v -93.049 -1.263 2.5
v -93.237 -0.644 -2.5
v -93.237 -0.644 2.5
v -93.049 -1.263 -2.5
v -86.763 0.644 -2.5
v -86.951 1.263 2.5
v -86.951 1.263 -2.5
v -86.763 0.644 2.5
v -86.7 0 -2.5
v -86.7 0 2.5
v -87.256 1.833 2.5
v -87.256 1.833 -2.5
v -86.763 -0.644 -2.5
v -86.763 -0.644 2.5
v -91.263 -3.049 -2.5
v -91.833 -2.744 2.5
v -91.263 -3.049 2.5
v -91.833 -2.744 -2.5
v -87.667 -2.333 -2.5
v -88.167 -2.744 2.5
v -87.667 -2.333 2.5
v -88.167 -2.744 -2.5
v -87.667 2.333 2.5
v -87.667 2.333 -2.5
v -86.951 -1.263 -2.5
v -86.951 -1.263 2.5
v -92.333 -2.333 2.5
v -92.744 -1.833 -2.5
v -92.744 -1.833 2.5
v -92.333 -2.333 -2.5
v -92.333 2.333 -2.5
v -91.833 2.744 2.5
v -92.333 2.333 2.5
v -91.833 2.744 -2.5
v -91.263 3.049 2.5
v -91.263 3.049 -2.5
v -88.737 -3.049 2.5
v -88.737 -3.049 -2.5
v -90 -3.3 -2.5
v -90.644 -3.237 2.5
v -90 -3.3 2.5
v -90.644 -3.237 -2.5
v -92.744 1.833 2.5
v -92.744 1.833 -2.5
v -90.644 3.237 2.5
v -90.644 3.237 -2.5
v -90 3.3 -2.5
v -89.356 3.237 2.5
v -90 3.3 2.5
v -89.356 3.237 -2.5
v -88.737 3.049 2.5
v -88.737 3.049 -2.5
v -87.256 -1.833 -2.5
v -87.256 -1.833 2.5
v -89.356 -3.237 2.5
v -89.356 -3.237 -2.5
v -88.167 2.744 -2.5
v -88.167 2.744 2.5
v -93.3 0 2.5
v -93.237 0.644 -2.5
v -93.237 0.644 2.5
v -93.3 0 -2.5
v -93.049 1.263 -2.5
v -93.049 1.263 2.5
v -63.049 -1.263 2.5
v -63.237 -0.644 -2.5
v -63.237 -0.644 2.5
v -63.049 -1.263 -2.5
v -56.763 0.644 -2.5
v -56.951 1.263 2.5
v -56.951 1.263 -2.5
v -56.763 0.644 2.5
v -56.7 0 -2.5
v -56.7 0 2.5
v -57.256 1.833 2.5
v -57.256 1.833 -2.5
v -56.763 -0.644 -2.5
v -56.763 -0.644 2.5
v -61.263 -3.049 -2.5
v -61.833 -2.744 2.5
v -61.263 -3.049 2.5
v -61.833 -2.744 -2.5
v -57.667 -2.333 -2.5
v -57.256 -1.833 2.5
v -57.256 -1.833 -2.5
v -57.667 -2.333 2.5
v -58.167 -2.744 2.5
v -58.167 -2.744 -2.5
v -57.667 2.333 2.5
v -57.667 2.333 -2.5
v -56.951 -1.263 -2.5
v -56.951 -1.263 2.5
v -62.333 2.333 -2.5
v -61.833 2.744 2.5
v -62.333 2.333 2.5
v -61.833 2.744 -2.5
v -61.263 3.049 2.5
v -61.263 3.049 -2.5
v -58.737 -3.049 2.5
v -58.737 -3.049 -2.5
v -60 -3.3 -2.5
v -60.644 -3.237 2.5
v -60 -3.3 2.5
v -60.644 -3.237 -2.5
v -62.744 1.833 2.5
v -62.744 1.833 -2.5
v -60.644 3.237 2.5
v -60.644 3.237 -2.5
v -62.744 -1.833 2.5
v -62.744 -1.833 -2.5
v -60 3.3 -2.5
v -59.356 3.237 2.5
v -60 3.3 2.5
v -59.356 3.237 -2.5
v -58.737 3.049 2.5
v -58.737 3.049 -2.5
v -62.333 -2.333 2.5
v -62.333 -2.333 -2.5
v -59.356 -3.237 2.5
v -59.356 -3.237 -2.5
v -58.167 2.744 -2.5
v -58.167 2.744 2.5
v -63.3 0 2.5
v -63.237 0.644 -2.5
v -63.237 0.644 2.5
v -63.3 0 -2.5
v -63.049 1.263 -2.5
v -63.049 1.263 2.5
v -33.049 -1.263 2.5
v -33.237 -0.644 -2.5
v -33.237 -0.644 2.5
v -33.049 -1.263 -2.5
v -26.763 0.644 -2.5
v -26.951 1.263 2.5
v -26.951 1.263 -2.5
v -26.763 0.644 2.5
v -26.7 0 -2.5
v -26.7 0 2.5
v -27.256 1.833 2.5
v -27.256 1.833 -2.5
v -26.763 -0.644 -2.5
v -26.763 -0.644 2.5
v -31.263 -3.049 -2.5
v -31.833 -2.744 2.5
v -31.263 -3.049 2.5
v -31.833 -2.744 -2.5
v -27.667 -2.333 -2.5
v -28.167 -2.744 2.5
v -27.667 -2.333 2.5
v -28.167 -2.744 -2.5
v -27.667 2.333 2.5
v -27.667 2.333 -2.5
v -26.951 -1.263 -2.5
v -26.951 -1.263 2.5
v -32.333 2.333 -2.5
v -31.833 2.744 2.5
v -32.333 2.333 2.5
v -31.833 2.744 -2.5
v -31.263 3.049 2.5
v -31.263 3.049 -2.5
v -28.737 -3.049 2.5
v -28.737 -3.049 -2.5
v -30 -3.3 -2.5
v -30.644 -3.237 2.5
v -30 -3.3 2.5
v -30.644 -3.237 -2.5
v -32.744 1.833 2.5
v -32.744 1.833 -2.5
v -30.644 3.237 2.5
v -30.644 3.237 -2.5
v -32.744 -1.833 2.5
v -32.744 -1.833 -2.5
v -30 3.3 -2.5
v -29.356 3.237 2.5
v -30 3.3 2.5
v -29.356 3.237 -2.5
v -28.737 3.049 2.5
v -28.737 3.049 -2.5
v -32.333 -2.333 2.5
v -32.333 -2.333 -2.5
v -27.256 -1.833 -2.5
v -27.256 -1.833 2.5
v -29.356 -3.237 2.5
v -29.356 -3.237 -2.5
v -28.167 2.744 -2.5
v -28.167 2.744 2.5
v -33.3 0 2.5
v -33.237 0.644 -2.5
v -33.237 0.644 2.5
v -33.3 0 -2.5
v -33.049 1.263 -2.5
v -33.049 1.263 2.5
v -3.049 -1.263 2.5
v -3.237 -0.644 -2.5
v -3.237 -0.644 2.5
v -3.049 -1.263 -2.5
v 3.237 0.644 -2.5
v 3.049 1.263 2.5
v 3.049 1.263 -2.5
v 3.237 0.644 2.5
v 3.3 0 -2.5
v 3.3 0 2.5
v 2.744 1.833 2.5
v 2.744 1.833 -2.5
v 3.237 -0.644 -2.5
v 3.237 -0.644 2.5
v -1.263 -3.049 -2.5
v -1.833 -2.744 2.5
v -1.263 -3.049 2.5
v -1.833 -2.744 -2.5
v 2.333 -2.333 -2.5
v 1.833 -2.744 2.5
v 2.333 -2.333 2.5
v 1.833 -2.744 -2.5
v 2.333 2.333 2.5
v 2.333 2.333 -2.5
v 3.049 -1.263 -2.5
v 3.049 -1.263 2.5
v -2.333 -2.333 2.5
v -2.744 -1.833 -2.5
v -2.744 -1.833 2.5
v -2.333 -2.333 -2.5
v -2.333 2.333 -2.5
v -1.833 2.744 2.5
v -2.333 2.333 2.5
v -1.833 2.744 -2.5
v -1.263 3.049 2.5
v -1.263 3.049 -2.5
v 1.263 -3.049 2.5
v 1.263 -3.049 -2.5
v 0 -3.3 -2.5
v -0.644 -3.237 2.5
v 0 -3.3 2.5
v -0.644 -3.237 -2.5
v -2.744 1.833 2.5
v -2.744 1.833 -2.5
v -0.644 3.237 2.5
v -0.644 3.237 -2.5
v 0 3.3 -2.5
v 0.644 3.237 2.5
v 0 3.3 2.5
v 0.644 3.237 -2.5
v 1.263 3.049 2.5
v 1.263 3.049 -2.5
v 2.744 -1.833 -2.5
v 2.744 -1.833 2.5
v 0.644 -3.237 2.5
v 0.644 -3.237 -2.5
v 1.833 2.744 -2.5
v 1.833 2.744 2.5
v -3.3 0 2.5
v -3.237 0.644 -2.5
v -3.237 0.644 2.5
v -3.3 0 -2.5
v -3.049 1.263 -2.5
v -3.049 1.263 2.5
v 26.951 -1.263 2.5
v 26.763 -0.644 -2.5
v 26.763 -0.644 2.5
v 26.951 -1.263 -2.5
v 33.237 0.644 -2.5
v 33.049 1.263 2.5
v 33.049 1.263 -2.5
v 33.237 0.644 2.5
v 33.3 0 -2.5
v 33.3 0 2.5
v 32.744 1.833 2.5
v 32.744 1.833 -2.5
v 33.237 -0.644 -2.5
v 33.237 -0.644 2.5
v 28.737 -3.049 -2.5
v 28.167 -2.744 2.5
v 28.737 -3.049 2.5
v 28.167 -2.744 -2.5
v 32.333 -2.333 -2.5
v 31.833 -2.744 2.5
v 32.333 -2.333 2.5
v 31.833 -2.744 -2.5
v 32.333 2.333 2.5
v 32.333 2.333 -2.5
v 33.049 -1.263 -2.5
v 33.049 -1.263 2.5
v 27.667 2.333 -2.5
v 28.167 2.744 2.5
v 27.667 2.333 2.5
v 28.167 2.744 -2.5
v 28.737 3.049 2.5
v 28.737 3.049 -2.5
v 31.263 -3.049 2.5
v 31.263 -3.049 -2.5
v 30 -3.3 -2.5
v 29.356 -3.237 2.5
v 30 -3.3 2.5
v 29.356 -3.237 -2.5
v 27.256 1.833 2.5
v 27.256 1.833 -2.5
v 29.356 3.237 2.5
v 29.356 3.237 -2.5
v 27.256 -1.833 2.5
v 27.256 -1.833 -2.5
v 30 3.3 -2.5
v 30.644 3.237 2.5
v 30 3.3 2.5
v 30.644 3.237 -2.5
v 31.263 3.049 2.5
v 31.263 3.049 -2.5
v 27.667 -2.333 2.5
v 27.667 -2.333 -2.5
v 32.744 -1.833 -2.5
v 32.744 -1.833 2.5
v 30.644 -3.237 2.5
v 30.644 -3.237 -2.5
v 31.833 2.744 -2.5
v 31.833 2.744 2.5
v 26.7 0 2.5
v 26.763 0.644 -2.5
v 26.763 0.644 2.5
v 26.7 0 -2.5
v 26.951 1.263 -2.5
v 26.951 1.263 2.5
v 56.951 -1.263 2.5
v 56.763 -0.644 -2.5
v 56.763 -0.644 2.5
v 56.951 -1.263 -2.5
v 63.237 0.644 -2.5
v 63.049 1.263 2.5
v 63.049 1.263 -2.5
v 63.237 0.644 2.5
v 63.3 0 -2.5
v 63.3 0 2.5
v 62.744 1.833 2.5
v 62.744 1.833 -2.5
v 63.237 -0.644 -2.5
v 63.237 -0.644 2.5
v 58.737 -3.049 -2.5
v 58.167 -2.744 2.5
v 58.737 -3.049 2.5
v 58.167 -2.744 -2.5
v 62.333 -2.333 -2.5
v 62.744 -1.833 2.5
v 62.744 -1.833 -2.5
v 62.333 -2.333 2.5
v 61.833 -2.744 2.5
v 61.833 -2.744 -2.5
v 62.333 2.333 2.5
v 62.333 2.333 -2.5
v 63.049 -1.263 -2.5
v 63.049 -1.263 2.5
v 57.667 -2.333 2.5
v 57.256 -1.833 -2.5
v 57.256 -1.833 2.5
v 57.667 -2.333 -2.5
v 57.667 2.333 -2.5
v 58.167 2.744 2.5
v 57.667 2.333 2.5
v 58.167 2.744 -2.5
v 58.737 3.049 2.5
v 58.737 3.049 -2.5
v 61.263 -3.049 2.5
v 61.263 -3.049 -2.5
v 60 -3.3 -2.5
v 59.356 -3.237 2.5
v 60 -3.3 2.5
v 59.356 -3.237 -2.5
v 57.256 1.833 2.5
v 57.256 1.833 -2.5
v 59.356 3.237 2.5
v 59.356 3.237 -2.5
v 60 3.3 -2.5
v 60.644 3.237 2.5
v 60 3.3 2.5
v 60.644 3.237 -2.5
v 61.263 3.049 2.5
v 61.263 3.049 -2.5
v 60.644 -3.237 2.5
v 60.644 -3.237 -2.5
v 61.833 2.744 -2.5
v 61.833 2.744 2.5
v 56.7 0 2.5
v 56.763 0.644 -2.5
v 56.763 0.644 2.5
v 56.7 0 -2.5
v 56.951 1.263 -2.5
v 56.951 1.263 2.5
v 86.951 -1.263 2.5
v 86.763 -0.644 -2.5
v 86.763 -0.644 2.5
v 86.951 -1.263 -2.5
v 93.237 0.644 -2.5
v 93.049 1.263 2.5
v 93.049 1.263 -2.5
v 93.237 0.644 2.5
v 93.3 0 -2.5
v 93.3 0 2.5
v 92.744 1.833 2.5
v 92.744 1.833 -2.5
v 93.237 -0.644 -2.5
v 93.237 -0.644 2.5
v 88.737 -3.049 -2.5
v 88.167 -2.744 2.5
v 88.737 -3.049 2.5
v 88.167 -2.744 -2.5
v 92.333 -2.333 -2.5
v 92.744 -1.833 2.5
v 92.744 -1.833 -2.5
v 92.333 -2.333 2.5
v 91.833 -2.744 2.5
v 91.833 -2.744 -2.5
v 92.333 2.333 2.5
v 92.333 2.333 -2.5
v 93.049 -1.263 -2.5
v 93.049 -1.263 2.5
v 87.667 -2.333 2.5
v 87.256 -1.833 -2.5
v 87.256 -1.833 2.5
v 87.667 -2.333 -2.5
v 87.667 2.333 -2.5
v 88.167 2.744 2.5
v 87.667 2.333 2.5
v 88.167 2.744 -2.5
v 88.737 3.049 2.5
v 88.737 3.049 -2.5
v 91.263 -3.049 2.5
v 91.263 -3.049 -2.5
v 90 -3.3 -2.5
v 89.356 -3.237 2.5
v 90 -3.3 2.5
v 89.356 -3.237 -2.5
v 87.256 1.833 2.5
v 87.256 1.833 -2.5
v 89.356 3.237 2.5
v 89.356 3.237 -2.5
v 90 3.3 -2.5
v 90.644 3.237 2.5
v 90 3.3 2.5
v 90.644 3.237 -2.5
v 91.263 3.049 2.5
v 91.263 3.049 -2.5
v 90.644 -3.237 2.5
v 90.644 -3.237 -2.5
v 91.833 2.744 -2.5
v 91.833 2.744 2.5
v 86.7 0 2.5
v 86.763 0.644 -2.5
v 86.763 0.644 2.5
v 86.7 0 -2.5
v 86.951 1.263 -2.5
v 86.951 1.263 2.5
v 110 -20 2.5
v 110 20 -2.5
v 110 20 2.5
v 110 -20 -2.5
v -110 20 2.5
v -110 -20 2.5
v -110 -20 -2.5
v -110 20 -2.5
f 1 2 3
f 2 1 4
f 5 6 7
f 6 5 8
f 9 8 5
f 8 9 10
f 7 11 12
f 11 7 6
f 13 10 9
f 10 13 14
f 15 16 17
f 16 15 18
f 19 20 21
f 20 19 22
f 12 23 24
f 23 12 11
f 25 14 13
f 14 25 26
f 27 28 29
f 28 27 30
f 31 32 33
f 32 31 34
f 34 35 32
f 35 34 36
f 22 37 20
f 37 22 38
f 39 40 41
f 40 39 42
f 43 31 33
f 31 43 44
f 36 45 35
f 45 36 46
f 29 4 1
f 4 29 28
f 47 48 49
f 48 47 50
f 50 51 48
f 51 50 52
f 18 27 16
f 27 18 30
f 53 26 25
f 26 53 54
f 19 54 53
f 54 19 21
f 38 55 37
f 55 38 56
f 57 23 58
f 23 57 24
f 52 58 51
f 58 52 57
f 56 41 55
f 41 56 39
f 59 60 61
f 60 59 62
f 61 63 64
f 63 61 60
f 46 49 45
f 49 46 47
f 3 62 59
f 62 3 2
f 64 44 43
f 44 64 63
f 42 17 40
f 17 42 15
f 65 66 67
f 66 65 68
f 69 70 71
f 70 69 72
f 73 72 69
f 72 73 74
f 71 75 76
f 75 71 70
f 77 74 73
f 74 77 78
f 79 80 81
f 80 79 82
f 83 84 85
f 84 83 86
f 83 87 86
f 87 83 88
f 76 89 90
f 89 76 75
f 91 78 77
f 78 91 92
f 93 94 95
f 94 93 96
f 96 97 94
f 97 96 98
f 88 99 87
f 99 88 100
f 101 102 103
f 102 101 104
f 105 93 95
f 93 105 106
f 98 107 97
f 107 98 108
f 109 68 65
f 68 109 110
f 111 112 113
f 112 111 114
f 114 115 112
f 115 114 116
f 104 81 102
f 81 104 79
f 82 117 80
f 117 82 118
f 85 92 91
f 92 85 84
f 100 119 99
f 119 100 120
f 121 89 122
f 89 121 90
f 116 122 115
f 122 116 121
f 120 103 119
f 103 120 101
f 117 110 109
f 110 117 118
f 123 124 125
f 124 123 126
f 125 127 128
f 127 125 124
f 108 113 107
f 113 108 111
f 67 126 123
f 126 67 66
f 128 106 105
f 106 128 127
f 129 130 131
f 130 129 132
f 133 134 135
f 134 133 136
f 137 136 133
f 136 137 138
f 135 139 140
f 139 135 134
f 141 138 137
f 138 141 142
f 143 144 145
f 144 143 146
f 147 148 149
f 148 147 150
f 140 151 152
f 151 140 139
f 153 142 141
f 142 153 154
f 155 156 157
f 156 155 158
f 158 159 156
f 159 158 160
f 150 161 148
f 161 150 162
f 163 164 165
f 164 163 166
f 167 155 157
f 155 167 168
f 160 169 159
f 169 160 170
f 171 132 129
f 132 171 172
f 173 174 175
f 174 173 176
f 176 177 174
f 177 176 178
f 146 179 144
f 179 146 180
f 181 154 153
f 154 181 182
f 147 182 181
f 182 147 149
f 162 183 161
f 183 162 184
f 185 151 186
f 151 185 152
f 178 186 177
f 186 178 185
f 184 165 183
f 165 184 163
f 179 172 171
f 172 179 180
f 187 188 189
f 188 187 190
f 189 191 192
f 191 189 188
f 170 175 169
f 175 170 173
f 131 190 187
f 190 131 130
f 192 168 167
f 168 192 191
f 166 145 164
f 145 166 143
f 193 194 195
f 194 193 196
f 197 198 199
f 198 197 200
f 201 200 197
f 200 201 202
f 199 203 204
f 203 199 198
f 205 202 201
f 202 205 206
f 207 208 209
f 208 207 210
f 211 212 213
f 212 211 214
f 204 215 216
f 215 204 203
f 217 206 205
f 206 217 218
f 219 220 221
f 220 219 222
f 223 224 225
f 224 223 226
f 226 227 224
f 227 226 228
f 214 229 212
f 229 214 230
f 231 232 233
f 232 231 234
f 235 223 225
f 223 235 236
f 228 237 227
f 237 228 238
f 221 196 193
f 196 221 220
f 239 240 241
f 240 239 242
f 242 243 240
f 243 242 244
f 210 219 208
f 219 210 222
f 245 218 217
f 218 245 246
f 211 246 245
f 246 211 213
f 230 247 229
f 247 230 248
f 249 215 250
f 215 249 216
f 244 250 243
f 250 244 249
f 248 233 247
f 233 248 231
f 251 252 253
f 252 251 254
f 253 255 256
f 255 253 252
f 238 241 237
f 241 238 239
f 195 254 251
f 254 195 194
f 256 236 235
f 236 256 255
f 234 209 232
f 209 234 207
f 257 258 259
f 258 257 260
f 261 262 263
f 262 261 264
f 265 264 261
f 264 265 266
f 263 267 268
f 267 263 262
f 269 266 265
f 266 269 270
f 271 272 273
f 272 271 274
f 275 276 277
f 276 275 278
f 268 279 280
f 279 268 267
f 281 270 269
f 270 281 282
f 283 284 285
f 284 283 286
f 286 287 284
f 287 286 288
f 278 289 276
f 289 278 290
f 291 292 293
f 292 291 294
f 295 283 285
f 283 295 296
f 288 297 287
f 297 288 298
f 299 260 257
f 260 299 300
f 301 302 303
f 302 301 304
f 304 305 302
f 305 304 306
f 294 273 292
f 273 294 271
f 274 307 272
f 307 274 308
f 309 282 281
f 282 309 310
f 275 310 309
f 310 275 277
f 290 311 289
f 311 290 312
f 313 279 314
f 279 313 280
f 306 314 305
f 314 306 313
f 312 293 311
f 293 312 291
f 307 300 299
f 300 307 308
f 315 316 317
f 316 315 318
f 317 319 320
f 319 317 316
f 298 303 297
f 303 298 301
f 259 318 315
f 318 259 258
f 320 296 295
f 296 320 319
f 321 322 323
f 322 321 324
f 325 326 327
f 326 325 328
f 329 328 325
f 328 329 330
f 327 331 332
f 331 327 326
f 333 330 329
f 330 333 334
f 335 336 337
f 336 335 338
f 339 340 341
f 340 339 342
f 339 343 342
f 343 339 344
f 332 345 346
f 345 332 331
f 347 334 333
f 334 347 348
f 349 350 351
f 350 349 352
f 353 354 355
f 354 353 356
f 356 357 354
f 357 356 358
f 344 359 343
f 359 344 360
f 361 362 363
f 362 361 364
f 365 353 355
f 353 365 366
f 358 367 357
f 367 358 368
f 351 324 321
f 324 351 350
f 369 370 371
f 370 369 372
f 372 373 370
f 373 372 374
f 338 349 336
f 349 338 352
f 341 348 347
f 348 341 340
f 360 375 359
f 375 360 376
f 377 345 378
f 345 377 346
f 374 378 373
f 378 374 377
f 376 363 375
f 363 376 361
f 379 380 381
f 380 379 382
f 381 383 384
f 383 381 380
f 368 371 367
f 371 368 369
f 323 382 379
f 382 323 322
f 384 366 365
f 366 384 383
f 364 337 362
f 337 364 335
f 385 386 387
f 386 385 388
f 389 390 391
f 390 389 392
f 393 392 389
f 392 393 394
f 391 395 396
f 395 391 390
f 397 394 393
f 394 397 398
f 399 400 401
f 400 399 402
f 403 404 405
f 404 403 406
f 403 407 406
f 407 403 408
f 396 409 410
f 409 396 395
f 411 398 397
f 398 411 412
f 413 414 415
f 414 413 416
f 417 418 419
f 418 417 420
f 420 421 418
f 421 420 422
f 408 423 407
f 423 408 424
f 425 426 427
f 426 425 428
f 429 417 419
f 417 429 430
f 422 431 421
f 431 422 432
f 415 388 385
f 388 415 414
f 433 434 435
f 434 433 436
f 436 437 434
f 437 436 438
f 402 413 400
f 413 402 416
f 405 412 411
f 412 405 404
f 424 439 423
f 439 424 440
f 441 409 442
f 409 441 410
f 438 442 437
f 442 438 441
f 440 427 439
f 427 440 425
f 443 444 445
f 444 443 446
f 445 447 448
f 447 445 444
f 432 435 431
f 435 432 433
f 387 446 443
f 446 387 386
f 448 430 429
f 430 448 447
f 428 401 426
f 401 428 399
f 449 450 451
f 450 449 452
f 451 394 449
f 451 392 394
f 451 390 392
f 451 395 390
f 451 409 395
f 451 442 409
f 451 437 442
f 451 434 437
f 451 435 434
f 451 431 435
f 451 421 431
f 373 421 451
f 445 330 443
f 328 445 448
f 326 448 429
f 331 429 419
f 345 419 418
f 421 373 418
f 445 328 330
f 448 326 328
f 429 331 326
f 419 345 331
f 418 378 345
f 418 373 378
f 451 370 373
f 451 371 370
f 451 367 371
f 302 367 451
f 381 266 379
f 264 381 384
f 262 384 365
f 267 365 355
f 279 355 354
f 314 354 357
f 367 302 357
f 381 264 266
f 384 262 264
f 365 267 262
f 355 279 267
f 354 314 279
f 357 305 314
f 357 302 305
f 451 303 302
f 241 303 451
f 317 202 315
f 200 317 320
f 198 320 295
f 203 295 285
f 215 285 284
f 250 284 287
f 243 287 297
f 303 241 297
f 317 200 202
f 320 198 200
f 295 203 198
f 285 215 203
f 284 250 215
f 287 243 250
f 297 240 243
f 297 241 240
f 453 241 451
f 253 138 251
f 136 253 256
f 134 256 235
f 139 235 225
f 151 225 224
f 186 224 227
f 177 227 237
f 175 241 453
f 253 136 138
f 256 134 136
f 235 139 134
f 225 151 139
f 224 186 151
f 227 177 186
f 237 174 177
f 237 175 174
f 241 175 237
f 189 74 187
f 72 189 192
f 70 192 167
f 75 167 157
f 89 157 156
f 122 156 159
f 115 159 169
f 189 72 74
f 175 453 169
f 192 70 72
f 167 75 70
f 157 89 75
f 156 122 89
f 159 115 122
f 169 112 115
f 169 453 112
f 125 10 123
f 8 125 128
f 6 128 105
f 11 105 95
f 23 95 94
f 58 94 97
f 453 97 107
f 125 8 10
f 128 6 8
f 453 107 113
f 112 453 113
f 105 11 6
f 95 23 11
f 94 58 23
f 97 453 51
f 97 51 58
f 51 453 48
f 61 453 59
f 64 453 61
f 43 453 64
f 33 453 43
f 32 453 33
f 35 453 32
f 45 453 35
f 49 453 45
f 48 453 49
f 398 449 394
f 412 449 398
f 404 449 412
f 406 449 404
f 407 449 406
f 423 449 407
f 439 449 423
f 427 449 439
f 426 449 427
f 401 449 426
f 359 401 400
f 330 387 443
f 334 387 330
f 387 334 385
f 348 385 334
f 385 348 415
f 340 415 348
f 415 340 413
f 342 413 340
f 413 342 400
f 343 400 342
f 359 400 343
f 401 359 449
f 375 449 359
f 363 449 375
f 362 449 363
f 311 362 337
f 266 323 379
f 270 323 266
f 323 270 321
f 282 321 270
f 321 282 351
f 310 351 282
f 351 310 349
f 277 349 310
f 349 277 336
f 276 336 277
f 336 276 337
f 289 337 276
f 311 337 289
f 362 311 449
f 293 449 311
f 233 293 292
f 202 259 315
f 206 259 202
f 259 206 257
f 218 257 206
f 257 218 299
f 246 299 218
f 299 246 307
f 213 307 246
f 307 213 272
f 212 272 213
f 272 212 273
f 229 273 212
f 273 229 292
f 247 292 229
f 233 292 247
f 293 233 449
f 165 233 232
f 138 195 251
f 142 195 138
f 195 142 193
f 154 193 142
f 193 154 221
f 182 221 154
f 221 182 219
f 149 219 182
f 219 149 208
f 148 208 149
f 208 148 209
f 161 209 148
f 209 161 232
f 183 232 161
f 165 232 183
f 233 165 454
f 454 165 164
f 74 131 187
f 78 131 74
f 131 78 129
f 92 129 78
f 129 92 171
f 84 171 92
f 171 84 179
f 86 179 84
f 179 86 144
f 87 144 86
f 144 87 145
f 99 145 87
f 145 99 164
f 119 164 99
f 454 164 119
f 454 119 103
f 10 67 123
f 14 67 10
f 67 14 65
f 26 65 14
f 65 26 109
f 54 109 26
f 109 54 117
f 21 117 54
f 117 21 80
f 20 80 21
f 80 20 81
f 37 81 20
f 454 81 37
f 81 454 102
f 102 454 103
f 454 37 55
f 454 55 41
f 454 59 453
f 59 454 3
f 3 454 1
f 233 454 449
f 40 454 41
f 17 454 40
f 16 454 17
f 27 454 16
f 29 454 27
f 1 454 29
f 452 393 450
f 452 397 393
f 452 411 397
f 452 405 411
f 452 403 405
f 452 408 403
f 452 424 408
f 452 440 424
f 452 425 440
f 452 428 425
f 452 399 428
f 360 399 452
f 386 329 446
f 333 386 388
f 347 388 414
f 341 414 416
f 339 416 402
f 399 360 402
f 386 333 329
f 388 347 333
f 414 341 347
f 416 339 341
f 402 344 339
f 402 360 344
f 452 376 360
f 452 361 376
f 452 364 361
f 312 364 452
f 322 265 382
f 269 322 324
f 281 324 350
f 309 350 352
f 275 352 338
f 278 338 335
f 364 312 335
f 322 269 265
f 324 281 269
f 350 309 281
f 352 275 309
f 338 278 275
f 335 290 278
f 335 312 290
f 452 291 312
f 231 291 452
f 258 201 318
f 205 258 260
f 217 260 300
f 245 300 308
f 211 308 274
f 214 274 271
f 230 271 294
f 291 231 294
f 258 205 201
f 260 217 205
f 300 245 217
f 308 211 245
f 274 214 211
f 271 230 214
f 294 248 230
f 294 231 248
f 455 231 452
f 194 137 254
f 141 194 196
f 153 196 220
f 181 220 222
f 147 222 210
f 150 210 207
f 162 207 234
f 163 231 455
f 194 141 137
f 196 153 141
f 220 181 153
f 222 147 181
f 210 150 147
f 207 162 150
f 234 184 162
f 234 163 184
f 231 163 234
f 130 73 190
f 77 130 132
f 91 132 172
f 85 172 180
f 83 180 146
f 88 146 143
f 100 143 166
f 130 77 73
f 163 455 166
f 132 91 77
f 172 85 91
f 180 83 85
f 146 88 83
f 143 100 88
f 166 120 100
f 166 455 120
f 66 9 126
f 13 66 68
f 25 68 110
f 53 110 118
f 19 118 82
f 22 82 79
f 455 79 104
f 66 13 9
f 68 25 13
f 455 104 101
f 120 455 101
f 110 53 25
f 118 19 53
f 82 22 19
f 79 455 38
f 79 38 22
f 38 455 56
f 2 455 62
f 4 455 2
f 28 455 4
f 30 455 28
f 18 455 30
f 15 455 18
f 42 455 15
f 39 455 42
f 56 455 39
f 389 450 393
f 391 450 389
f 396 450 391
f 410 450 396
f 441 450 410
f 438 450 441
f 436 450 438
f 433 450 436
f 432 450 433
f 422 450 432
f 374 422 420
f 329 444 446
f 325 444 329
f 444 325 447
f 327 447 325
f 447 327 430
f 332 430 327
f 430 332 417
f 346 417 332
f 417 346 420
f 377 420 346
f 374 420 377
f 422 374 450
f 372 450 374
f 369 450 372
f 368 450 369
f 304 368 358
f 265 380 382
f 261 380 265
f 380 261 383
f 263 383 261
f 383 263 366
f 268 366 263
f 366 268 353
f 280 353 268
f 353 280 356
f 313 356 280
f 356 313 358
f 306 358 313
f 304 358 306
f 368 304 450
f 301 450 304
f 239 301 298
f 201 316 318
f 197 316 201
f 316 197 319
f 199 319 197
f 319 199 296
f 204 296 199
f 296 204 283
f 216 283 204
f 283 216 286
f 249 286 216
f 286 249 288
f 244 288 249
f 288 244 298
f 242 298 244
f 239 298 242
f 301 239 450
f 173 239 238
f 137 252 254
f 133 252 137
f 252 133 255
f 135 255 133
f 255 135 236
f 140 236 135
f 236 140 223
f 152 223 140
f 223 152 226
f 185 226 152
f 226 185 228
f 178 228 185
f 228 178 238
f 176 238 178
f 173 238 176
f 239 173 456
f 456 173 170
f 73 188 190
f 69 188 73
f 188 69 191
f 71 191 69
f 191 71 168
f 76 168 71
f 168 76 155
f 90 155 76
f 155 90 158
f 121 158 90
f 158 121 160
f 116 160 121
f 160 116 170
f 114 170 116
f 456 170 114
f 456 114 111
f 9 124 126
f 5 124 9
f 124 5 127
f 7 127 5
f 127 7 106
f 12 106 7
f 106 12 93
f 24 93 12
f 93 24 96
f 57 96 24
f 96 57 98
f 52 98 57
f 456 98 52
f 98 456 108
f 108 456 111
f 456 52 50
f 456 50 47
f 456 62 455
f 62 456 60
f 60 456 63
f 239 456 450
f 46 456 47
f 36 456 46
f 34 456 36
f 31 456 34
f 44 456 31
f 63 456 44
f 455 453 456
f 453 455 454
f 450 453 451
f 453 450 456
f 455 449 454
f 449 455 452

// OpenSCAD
$fn = 32;

// ----------------------------------------------------------------------
// Hole bar, 7 x Ø6.6
// row layout, 20 mm edge offset
// ----------------------------------------------------------------------

// --- parameters (mm) ---
bar_w = 40;    // bar width (Y)
bar_t = 5;     // bar thickness (Z)
holes = 7;     // holes per row
hole_d = 6.6;  // hole diameter
edge = 20;     // offset from the bar end to the first hole
pitch = 30;    // pitch between neighbouring holes

// --- derived feature positions (mm) ---
span = (holes - 1) * pitch;   // = 180   distance between the end holes
bar_l = span + 2 * edge;      // = 220   overall bar length
start_x = -bar_l / 2 + edge;  // = -90   X of the first hole
feature_centers = [
  [start_x + 0 * pitch, 0],
  [start_x + 1 * pitch, 0],
  [start_x + 2 * pitch, 0],
  [start_x + 3 * pitch, 0],
  [start_x + 4 * pitch, 0],
  [start_x + 5 * pitch, 0],
  [start_x + 6 * pitch, 0]
];   // hole centres of the first row

// bar with one row of holes, drilled from feature_centers
difference() {
  translate([-bar_l / 2, -bar_w / 2, -bar_t / 2]) cube([bar_l, bar_w, bar_t]);
  for (centre = feature_centers)
    translate([centre[0], centre[1], 0])
      cylinder(d = hole_d, h = bar_t + 2, center = true);
}
